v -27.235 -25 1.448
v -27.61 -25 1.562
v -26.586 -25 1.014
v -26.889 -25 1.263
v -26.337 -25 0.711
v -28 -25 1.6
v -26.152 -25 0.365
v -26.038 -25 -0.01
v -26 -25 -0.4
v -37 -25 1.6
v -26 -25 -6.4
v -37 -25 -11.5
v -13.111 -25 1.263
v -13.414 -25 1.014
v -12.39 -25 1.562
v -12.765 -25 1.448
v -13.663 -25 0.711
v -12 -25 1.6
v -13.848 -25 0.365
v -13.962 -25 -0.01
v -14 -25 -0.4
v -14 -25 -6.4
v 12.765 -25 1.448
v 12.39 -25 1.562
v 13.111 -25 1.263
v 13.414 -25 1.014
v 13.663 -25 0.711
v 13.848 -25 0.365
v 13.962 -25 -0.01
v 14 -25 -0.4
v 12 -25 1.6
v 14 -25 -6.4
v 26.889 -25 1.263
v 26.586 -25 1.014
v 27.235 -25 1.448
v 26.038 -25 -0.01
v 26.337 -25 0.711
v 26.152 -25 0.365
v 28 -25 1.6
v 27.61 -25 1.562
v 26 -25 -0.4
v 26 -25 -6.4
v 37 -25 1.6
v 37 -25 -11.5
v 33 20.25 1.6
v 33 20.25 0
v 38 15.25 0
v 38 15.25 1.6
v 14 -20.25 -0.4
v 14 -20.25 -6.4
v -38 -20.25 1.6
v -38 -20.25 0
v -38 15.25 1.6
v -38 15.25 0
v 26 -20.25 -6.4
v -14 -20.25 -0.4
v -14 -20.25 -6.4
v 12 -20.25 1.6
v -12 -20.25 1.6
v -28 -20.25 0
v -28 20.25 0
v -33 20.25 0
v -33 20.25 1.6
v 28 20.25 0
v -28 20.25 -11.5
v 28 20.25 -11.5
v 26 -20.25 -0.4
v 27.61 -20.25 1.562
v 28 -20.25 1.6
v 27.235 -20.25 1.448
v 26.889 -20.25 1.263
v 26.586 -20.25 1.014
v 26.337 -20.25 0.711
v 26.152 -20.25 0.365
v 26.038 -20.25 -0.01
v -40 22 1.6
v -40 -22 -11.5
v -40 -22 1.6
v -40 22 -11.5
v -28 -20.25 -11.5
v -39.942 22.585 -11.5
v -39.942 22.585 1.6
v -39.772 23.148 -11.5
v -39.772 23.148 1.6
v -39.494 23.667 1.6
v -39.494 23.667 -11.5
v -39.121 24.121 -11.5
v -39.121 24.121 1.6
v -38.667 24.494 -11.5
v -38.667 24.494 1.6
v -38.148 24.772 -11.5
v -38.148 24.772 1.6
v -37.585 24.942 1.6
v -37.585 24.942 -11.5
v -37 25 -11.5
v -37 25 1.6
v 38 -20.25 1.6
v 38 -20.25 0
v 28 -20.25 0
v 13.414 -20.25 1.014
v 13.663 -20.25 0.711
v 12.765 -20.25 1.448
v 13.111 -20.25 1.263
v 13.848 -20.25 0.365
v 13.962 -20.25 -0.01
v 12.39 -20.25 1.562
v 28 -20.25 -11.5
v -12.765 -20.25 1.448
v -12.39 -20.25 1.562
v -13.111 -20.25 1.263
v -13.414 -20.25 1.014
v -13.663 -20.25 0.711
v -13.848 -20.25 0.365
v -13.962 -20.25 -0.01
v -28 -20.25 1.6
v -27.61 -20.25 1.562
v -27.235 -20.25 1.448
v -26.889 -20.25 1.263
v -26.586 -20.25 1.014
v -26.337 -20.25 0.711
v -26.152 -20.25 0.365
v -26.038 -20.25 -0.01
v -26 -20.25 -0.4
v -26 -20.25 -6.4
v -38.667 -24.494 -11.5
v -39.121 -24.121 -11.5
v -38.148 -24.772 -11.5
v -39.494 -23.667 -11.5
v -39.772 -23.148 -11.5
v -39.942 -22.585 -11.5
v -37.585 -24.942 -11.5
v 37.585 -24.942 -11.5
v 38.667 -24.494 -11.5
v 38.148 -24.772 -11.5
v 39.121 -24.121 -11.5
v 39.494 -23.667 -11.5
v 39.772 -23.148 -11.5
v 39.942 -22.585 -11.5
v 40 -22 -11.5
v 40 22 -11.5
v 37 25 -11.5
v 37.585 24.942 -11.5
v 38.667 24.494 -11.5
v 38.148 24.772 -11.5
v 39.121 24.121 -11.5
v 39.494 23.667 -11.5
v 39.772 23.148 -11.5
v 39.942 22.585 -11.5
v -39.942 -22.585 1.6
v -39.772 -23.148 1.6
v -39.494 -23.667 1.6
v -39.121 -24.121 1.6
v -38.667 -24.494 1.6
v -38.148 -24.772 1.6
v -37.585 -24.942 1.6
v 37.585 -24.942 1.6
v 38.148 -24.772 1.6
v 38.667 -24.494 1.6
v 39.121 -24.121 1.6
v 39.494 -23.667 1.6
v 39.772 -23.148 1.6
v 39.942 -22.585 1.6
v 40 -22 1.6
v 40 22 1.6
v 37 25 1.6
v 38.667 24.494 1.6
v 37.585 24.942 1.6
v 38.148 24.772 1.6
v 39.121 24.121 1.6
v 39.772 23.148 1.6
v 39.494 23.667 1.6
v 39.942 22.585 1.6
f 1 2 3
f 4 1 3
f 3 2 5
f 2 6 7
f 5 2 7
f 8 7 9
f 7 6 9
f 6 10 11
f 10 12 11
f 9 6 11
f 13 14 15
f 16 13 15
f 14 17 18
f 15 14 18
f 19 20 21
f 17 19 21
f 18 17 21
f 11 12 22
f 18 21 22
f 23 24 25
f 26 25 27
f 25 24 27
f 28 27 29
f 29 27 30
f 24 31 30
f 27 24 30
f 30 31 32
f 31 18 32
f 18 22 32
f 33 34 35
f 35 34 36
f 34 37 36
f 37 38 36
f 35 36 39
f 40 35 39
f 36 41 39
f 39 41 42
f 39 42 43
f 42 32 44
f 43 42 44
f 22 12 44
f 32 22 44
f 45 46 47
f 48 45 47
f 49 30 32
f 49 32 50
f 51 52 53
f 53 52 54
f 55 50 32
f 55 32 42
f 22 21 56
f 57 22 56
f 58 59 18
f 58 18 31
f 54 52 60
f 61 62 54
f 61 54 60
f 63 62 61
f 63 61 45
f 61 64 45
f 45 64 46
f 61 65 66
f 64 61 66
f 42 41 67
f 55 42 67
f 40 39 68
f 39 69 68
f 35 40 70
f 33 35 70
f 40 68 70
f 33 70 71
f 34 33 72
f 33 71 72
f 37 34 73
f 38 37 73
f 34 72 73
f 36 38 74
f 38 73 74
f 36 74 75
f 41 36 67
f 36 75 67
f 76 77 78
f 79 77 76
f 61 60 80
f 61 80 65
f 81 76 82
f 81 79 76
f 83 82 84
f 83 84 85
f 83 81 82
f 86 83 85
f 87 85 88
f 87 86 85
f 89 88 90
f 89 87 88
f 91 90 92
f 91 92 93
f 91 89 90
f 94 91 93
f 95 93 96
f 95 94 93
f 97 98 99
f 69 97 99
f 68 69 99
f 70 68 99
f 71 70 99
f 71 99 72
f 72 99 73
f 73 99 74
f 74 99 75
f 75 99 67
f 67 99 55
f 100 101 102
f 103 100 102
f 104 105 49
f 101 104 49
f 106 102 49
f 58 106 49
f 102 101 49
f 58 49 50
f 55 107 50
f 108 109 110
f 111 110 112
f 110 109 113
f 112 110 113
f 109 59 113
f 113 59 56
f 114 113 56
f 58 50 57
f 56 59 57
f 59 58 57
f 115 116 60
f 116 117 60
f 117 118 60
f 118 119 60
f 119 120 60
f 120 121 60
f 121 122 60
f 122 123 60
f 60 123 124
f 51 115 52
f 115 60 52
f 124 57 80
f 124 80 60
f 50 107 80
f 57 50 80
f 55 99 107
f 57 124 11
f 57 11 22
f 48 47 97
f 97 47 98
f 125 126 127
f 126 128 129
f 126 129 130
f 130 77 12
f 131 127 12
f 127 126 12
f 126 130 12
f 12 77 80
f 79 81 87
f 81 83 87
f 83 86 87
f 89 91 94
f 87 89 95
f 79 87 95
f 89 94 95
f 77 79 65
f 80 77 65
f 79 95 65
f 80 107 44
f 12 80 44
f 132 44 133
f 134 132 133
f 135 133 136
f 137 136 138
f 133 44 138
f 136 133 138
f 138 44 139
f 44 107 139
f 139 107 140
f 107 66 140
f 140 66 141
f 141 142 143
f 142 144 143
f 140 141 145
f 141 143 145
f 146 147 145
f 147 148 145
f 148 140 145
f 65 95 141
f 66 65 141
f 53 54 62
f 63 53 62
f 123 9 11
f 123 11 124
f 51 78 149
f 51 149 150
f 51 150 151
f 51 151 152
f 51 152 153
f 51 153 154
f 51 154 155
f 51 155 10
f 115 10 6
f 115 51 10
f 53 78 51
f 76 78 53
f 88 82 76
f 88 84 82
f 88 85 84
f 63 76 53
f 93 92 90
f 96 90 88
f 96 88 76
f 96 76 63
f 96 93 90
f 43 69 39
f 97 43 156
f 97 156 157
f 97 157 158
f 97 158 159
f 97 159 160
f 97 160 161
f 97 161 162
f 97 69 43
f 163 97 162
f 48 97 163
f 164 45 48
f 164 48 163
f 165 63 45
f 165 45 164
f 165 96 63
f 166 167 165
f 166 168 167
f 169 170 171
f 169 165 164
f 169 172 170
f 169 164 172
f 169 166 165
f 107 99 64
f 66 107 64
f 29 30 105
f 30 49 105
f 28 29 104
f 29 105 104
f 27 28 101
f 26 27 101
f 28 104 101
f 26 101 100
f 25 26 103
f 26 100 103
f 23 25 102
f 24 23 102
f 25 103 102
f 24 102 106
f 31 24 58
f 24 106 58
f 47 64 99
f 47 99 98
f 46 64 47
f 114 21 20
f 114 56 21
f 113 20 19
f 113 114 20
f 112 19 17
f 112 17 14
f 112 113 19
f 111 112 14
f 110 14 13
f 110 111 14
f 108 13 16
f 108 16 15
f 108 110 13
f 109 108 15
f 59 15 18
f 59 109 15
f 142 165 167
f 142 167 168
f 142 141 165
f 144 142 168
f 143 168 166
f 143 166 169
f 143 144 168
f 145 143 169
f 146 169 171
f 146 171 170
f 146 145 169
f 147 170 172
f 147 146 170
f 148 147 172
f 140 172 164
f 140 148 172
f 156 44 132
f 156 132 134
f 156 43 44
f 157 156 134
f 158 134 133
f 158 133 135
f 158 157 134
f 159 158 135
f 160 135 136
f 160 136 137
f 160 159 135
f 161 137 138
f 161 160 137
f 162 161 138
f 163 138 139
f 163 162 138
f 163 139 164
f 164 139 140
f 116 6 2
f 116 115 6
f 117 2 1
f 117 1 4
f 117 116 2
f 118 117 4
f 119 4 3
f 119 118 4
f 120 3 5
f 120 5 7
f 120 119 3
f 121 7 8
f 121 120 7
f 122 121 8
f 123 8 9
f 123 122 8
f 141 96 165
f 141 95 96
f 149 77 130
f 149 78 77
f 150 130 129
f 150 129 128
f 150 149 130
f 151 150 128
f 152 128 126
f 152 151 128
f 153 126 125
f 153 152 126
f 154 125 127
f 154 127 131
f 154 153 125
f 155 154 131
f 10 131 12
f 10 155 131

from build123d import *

# Parameters (mm, degrees)
F0_W     = 80
F0_H     = 50
F1_DEPTH = 11.5
F2_W     = 80
F2_H     = 50
F3_DEPTH = 1.6
F4_W     = 56
F4_H     = 40.5
F5_DEPTH = 11.5
F6_W     = 12
F6_H     = 4.75
F7_DEPTH = 8
F8_R     = 3
F9_R     = 2


with BuildPart() as f1:
    # F0 (on Top) → F1 (new body)
    with BuildSketch(Plane.XY):
        Rectangle(F0_W, F0_H)
    extrude(amount=-F1_DEPTH)

    # F2 (on face) → F3 (join)
    with BuildSketch(Plane.XY):
        Rectangle(F2_W, F2_H)
        Polygon((38, -20.25), (-38, -20.25), (-38, 15.25), (-33, 20.25), (33, 20.25), (38, 15.25), align=None, mode=Mode.SUBTRACT)
    extrude(amount=F3_DEPTH)

    # F4 (on face) → F5 (cut, through all)
    with BuildSketch(Plane.XY):
        Rectangle(F4_W, F4_H)
    extrude(amount=-F5_DEPTH, mode=Mode.SUBTRACT)

    # F6 (on face) → F7 (cut)
    with BuildSketch(Plane.XY.offset(1.6)):
        with Locations((-20, -22.625)):
            Rectangle(F6_W, F6_H)
        with Locations((20, -22.625)):
            Rectangle(F6_W, F6_H)
    extrude(amount=-F7_DEPTH, mode=Mode.SUBTRACT)

    # F8
    f8_edges = [f1.edges().sort_by_distance(p)[0] for p in [
        (-40, 25, -4.95),
        (-40, -25, -4.95),
        (40, -25, -4.95),
        (40, 25, -4.95),
    ]]
    fillet(f8_edges, radius=F8_R)

    # F9
    f9_edges = [f1.edges().sort_by_distance(p)[0] for p in [
        (-26, -22.625, 1.6),
        (-14, -22.625, 1.6),
        (14, -22.625, 1.6),
        (26, -22.625, 1.6),
    ]]
    fillet(f9_edges, radius=F9_R)


solid = f1.part
